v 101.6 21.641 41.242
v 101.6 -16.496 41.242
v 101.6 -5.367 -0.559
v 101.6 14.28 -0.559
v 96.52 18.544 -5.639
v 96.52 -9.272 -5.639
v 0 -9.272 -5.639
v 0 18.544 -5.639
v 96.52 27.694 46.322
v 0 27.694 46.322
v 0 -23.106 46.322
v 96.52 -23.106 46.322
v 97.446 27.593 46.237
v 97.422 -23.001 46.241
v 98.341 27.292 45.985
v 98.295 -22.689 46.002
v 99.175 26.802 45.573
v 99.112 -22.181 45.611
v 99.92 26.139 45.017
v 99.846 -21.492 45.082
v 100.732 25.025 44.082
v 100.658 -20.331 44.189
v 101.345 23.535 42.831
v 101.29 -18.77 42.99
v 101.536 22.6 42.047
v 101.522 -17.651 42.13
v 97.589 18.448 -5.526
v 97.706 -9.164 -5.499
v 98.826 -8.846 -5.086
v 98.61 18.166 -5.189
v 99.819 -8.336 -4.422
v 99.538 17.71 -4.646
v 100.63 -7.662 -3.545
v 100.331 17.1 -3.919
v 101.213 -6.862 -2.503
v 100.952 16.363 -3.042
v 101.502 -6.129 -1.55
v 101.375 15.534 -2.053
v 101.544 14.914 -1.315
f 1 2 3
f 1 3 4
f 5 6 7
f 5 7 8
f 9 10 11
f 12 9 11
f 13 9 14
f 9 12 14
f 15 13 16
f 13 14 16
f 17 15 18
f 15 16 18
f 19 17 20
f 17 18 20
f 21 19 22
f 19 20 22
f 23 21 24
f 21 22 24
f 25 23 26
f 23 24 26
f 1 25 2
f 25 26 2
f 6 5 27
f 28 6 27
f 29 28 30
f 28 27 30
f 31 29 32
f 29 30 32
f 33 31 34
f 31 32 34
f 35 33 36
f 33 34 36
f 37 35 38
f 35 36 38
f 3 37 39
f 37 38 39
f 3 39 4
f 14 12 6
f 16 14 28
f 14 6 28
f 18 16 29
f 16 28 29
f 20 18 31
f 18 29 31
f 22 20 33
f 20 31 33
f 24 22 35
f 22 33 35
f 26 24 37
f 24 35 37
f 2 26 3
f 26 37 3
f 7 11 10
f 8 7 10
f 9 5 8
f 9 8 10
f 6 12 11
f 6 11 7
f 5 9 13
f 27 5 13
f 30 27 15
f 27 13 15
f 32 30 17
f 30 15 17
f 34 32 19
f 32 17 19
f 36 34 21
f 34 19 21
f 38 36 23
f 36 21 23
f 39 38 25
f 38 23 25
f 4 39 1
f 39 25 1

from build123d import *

# Parameters (mm, degrees)
F1_DEPTH = 101.6
F2_R     = 5.08


with BuildPart() as f1:
    # F0 (on Right) → F1 (new body)
    with BuildSketch(Plane.YZ):
        Polygon((27.6941948846, 46.3221500594), (-23.1058051154, 46.3221500594), (-9.271863848, -5.6394003332), (18.5437425971, -5.6394003332), align=None)
    extrude(amount=F1_DEPTH)

    # F2
    f2_edges = [f1.edges().sort_by_distance(p)[0] for p in [
        (101.6, -16.188834, 20.341375),
        (101.6, 4.635939, -5.6394),
        (101.6, 23.118969, 20.341375),
        (101.6, 2.294195, 46.32215),
    ]]
    fillet(f2_edges, radius=F2_R)


solid = f1.part
